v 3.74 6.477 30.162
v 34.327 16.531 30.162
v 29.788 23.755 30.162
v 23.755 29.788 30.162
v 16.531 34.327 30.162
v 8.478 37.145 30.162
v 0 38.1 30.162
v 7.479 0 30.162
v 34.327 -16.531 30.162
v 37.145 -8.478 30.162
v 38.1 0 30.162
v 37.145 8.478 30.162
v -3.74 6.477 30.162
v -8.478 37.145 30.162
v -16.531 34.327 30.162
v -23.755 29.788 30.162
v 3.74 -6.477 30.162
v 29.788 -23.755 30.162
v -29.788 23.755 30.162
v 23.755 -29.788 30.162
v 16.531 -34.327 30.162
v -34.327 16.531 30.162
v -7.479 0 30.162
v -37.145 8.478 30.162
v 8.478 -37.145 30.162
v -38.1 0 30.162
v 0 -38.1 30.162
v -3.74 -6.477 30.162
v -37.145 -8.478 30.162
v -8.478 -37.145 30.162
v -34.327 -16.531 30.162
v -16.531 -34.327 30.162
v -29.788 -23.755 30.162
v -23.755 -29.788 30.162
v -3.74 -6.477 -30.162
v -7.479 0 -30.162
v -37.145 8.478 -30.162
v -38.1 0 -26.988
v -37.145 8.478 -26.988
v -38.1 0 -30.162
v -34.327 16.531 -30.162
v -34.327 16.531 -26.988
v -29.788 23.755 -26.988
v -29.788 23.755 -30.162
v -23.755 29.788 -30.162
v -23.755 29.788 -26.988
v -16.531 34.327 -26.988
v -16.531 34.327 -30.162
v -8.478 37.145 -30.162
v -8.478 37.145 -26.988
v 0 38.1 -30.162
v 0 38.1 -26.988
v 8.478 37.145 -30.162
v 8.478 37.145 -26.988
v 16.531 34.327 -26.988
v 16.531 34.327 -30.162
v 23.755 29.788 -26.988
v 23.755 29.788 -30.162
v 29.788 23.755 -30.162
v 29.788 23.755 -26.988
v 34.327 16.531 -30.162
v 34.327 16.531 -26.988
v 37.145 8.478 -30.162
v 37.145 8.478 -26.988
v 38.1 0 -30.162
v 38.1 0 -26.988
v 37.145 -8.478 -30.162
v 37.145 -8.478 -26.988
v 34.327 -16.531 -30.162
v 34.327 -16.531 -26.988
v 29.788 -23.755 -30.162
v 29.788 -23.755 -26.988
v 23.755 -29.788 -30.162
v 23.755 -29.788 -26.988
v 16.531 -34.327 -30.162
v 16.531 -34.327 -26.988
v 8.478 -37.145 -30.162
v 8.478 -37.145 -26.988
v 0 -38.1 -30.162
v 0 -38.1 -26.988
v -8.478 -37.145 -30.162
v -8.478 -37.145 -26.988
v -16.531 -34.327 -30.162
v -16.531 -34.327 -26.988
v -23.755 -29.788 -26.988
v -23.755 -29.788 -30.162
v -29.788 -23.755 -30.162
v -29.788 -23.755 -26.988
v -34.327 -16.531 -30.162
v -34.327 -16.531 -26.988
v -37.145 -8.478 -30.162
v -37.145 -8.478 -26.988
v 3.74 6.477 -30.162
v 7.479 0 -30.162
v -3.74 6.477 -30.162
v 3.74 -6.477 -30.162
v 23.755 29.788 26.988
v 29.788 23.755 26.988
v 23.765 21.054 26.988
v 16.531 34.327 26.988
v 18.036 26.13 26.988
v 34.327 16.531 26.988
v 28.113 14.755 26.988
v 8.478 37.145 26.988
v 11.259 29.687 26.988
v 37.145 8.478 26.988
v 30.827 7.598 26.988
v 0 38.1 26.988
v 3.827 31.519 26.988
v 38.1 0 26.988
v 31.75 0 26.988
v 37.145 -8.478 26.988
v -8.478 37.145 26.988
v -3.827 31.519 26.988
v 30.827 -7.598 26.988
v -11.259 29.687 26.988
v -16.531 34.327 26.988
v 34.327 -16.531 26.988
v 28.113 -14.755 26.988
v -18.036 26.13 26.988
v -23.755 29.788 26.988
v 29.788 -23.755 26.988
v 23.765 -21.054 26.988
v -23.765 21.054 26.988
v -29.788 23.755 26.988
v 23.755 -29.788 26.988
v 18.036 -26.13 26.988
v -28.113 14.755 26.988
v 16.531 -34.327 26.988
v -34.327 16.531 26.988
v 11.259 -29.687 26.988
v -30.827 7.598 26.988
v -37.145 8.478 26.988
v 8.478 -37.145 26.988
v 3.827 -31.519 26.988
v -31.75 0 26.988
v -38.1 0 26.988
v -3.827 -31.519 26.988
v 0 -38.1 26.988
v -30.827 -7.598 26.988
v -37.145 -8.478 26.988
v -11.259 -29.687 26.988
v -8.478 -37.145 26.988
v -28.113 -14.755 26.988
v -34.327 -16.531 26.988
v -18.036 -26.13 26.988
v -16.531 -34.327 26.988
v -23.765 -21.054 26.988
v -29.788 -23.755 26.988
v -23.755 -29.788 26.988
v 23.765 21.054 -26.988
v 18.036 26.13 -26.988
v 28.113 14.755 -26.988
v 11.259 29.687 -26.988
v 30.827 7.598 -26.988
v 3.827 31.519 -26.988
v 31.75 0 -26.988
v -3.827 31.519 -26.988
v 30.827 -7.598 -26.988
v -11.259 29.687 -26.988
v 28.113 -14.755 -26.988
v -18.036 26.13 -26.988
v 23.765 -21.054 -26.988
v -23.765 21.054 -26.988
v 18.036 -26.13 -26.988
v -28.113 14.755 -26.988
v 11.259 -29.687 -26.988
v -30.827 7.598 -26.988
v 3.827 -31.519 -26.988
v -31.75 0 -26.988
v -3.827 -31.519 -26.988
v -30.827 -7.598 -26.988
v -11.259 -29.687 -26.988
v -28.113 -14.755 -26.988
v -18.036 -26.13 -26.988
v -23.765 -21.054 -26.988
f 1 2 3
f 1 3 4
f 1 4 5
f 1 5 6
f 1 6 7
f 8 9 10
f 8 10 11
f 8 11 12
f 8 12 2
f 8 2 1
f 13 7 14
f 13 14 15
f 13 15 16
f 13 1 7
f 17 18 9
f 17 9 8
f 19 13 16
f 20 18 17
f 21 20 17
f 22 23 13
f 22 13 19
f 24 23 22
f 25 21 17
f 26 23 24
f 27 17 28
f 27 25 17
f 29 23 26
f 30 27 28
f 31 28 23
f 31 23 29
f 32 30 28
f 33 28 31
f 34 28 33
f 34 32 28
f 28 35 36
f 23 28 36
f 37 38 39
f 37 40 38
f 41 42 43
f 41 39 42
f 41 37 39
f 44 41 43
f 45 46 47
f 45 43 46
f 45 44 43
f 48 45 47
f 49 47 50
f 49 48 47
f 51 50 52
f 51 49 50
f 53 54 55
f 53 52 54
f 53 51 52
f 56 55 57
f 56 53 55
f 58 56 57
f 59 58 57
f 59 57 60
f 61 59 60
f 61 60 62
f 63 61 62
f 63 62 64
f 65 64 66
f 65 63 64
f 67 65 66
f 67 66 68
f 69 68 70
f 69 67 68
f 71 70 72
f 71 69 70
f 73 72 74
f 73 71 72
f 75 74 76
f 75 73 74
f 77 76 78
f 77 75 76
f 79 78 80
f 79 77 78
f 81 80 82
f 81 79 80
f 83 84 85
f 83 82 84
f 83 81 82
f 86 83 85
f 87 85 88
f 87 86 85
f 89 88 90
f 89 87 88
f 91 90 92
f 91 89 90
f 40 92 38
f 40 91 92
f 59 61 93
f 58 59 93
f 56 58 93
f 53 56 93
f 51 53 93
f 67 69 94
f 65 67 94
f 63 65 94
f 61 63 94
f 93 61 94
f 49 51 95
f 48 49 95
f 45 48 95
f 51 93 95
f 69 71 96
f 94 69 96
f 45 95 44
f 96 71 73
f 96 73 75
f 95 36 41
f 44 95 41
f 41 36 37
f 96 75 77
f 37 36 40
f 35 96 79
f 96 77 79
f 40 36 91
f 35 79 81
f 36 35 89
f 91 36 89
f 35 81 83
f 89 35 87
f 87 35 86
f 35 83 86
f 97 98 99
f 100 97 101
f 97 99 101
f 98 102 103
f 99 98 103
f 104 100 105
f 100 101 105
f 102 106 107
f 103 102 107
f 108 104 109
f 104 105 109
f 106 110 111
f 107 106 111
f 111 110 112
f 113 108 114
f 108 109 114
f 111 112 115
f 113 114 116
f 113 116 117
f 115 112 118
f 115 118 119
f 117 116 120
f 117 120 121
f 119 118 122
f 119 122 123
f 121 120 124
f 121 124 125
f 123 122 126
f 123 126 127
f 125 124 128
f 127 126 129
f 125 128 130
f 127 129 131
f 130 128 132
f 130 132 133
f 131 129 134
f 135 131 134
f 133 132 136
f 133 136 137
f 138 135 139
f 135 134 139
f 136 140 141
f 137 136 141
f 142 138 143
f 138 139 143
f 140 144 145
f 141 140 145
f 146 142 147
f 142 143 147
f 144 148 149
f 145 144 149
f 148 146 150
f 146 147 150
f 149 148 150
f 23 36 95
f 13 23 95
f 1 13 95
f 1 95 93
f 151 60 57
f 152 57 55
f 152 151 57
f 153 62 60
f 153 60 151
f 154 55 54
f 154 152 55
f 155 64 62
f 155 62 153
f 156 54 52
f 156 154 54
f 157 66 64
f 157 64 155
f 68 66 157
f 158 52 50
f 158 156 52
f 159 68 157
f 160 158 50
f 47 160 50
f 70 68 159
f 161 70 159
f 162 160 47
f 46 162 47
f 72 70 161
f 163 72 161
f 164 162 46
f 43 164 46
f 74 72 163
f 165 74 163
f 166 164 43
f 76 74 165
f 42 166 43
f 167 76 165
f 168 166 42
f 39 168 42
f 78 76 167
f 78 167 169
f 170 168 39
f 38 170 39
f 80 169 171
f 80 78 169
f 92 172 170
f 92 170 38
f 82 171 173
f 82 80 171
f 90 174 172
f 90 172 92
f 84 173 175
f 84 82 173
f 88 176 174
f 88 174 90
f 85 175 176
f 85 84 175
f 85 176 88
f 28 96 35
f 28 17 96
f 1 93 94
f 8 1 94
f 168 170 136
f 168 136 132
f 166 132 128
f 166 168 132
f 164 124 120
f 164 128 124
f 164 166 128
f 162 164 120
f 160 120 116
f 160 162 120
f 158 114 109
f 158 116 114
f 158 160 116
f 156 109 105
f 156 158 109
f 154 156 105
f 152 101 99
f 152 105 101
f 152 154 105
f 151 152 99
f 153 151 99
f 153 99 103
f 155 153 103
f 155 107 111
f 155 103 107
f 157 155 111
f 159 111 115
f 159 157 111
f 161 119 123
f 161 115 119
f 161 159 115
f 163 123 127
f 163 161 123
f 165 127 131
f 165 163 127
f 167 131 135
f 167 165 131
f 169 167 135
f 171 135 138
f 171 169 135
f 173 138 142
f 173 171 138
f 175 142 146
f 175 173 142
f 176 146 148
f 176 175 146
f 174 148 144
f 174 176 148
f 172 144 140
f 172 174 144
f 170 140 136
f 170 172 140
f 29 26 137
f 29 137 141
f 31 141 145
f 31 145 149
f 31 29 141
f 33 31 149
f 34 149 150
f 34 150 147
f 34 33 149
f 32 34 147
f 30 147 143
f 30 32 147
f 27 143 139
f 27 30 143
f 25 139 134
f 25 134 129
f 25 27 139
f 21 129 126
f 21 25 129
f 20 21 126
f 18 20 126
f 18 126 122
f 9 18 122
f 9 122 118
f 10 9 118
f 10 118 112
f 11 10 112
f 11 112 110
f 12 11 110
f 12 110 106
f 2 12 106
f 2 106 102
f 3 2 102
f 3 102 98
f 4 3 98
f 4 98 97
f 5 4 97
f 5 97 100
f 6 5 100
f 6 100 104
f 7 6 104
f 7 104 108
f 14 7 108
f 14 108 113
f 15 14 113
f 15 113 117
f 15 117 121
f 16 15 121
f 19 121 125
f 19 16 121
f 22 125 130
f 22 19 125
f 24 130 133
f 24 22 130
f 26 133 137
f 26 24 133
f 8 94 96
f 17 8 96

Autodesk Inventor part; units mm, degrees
ref_plane "YZ Plane" through (0, 0, 0) normal (1, 0, 0) x (0, 1, 0)
ref_plane "XZ Plane" through (0, 0, 0) normal (0, 1, 0) x (-1, 0, 0)
ref_plane "XY Plane" through (0, 0, 0) normal (0, 0, 1) x (1, 0, 0)
sketch "Sketch1" plane through (0, 0, 0) normal (0, 1, 0) x (-1, 0, 0)
  line L0 (31.75, -26.9875) -> (0, -26.9875)
  line L1 (0, -26.9875) -> (0, 26.9875)
  line L2 (0, 26.9875) -> (31.75, 26.9875)
  line L3 (31.75, 26.9875) -> (31.75, -26.9875)
  line L4 (0, -26.9875) -> (38.1, -26.9875)
  line L5 (38.1, -26.9875) -> (38.1, -30.1625)
  line L6 (38.1, -30.1625) -> (0, -30.1625)
  line L7 (0, -30.1625) -> (0, -26.9875)
  line L8 (0, 26.9875) -> (38.1, 26.9875)
  line L9 (38.1, 26.9875) -> (38.1, 30.1625)
  line L10 (38.1, 30.1625) -> (0, 30.1625)
  line L11 (0, 30.1625) -> (0, 26.9875)
  line L12 (0, 0) -> (51.6774, 0) construction
  point P0 (31.75, -26.9875)
  point P1 (31.75, 26.9875)
  dimension "d0" = 53.975
  dimension "d1" = 6.35
  dimension "d2" = 60.325
  dimension "d4" = 31.75
revolve "Revolution1" add sketch "Sketch1" angle 360 about axis through (0, 0, -26.9875) along (0, 0, 1)
sketch "Sketch2" plane through (0, 0, 30.1625) normal (0, 0, 1) x (1, 0, 0)
  line L0 (7.479, 0) -> (3.7395, -6.477)
  line L1 (3.7395, -6.477) -> (-3.7395, -6.477)
  line L2 (-3.7395, -6.477) -> (-7.479, 0)
  line L3 (-7.479, 0) -> (-3.7395, 6.477)
  line L4 (-3.7395, 6.477) -> (3.7395, 6.477)
  line L5 (3.7395, 6.477) -> (7.479, 0)
  point P0 (0, 0)
  point P1 (0, 0)
  point P2 (0, 6.477)
  dimension "d6" = 12.954
extrude "Extrusion1" cut sketch "Sketch2" against normal through all
equation "\"d4\" = d9"
equation "\"d9\" = 31.75"
properties part number "Polybelt Wheels" material "ABS Plastic"
